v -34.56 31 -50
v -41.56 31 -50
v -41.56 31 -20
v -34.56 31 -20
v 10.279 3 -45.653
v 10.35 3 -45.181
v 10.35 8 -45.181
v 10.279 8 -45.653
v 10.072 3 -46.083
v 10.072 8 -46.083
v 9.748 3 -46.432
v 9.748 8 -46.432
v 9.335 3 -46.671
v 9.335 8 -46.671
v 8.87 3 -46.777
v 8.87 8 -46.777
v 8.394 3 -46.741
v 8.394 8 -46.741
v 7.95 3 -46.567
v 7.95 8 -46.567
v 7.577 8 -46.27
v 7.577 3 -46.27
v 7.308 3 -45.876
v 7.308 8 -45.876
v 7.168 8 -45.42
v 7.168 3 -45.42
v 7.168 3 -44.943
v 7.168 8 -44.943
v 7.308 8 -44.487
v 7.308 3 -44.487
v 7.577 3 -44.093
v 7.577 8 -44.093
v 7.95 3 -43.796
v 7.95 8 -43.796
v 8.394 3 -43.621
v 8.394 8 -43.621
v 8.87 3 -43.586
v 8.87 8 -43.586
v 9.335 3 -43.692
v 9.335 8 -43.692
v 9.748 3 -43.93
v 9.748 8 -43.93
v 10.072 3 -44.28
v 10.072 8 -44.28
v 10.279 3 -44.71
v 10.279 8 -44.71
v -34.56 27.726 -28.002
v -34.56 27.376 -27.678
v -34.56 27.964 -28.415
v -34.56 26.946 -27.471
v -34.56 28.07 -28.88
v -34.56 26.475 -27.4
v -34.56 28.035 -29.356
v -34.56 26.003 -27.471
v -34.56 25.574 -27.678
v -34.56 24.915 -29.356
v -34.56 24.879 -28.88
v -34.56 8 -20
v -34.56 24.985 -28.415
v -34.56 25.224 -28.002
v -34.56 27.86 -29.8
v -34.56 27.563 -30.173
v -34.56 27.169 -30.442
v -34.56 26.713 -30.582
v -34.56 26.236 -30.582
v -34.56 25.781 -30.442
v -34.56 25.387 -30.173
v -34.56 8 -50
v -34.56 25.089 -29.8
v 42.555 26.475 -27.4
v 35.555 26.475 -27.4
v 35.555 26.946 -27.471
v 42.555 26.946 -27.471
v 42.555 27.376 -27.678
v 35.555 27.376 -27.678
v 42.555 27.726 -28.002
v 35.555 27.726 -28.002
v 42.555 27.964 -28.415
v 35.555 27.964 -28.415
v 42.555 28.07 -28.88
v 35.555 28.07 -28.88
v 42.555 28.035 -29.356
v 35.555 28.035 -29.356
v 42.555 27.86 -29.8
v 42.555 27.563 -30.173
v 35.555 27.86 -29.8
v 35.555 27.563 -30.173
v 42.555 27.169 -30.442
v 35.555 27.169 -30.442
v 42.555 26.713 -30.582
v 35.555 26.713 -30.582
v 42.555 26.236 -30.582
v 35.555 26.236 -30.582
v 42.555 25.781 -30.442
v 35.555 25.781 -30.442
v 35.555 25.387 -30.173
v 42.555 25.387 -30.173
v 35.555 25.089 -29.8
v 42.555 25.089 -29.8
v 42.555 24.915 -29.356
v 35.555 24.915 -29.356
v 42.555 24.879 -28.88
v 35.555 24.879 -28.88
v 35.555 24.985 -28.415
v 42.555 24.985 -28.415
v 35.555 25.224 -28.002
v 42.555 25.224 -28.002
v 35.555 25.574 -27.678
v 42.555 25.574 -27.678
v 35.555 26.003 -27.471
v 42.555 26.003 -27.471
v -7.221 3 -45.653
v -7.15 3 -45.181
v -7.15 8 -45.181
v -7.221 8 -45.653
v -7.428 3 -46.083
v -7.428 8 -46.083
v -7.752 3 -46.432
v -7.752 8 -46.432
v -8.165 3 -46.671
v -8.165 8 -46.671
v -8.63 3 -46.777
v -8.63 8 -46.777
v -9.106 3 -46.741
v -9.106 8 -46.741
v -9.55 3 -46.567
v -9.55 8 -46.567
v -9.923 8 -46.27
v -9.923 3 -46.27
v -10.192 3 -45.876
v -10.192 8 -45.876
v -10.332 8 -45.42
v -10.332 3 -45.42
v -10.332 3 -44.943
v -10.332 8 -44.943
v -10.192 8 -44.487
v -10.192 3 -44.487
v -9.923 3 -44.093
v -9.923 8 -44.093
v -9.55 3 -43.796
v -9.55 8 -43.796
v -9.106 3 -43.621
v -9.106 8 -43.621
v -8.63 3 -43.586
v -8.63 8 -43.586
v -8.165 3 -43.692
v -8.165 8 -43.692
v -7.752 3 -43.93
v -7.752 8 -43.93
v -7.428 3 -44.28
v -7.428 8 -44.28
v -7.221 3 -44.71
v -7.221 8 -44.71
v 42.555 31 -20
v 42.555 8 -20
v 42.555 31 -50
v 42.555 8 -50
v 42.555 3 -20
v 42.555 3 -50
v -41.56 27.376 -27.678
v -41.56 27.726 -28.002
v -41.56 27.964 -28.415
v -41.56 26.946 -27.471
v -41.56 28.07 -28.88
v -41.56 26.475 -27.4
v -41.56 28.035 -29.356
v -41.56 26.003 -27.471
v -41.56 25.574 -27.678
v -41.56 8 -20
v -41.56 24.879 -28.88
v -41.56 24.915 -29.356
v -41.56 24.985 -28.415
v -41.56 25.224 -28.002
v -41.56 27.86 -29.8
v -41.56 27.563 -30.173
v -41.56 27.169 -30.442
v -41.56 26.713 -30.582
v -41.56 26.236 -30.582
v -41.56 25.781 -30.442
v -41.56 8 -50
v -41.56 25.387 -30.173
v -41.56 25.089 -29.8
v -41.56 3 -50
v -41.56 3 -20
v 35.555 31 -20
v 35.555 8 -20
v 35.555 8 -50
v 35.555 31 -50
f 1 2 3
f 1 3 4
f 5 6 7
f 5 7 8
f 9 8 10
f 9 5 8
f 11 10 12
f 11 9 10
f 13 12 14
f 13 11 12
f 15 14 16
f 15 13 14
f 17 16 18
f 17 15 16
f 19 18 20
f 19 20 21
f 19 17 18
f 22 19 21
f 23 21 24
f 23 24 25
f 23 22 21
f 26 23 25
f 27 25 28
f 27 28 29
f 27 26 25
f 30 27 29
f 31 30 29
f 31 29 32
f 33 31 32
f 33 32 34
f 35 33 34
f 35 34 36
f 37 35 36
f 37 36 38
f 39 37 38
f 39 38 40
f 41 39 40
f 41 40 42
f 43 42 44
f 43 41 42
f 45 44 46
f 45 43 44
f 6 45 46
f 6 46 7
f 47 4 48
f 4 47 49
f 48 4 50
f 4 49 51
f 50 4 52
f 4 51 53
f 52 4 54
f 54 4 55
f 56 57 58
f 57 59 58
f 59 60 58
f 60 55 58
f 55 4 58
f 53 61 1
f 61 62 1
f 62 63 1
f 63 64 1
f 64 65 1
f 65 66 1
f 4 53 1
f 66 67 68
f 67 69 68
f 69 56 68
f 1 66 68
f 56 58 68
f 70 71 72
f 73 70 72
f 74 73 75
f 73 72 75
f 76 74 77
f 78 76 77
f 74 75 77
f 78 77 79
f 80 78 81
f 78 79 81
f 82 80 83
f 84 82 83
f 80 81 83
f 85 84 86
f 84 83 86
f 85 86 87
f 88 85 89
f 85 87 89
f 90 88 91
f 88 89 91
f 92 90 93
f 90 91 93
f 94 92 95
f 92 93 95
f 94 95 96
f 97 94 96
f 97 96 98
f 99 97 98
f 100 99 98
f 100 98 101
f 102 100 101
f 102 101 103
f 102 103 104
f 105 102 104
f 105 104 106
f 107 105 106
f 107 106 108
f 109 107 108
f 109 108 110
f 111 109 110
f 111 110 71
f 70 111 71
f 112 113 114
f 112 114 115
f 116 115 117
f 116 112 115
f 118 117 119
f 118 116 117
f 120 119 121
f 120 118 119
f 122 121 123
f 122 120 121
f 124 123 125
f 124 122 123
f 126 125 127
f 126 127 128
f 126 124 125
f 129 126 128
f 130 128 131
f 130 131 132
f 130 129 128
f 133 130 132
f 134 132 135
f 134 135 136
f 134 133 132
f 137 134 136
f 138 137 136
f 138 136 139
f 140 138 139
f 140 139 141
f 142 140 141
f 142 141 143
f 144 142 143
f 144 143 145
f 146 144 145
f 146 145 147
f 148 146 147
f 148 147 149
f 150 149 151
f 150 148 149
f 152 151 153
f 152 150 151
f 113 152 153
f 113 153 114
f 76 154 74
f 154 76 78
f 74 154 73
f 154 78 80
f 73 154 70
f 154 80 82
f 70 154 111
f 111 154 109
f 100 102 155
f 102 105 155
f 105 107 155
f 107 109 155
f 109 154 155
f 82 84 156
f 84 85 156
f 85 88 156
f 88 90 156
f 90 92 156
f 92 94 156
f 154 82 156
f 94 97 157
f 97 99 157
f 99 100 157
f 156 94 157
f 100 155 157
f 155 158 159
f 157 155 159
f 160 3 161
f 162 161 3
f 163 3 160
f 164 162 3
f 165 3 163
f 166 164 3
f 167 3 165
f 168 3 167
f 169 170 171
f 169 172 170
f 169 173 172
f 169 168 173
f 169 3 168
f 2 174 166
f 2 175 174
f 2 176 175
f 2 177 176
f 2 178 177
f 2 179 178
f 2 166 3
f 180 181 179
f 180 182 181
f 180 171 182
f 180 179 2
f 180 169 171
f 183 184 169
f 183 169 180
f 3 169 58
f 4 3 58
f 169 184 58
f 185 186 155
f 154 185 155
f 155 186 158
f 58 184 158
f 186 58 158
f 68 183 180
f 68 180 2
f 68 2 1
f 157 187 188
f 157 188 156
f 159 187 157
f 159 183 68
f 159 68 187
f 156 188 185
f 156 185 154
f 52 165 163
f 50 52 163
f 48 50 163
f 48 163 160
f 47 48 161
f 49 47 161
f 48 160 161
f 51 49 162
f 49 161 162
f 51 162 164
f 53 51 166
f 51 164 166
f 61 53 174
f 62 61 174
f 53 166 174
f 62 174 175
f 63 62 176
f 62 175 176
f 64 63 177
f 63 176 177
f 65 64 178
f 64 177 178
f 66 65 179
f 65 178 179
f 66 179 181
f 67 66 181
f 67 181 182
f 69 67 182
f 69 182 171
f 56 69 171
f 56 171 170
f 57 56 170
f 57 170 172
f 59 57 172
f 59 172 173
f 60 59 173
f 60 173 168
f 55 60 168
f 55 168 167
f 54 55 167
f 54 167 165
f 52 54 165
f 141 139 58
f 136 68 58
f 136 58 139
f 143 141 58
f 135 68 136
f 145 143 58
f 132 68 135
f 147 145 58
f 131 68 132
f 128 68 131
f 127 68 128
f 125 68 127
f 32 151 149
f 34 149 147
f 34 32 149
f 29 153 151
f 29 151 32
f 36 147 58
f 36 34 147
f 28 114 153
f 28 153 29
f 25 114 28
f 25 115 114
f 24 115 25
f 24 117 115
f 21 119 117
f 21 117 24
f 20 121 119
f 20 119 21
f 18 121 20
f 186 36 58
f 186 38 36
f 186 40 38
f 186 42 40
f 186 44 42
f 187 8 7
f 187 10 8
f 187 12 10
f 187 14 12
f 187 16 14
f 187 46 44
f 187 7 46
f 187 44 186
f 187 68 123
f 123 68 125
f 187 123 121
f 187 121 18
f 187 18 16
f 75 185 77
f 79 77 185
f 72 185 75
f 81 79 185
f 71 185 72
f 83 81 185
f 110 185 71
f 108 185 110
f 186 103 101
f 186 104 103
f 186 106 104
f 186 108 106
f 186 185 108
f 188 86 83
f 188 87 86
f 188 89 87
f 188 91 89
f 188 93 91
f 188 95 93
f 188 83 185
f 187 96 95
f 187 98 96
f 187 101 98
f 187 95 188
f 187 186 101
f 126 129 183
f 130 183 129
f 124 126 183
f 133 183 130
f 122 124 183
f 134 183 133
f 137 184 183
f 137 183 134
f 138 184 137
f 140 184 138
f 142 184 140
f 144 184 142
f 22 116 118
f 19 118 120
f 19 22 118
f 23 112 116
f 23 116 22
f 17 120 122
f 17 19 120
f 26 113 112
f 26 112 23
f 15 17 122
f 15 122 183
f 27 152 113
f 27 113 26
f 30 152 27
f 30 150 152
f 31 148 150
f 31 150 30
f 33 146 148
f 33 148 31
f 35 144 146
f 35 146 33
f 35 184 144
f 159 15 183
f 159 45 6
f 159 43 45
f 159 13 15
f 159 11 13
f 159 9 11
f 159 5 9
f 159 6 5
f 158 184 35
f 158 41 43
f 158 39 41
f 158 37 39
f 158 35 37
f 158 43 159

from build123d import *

# Parameters (mm, degrees)
SKETCH1_W           = 95.7
SKETCH1_H           = 100
SKETCH1_R           = 1.6
BOSS_EXTRUDE1_DEPTH = 3
SKETCH2_W           = 84.114636839
SKETCH2_H           = 30
SKETCH2_R           = 1.6
BOSS_EXTRUDE2_DEPTH = 5
SKETCH3_W           = 7
SKETCH3_H           = 30
BOSS_EXTRUDE3_DEPTH = 23
SKETCH4_R           = 1.6
CUT_EXTRUDE1_DEPTH  = 114
SKETCH5_W           = 95.7
SKETCH5_H           = 6
CUT_EXTRUDE2_DEPTH  = 114


with BuildPart() as part:
    # Sketch1 → Boss-Extrude1 (new body, symmetric)
    with BuildSketch(Plane(origin=(0, 0, 0), x_dir=(1, 0, 0), z_dir=(0, 1, 0))):
        Rectangle(SKETCH1_W, SKETCH1_H)
        with Locations((-8.75, 45.181367204)):
            Circle(SKETCH1_R, mode=Mode.SUBTRACT)
        with Locations((8.75, 45.181367204)):
            Circle(SKETCH1_R, mode=Mode.SUBTRACT)
        with Locations((0, -46)):
            Circle(SKETCH1_R, mode=Mode.SUBTRACT)
    extrude(amount=BOSS_EXTRUDE1_DEPTH, both=True)

    # Sketch2 → Boss-Extrude2 (add)
    with BuildSketch(Plane(origin=(0, 3, 0), x_dir=(1, 0, 0), z_dir=(0, 1, 0))):
        with Locations((0.497719744, 35)):
            Rectangle(SKETCH2_W, SKETCH2_H)
        with Locations((-8.75, 45.181367204)):
            Circle(SKETCH2_R, mode=Mode.SUBTRACT)
        with Locations((8.75, 45.181367204)):
            Circle(SKETCH2_R, mode=Mode.SUBTRACT)
        with Locations((0.497719744, 35)):
            Rectangle(SKETCH2_W, SKETCH2_H)
        with Locations((-8.75, 45.181367204)):
            Circle(SKETCH2_R, mode=Mode.SUBTRACT)
        with Locations((8.75, 45.181367204)):
            Circle(SKETCH2_R, mode=Mode.SUBTRACT)
    extrude(amount=BOSS_EXTRUDE2_DEPTH)

    # Sketch3 → Boss-Extrude3 (add)
    with BuildSketch(Plane(origin=(0, 8, 0), x_dir=(1, 0, 0), z_dir=(0, 1, 0))):
        with Locations((-38.059598675, 35)):
            Rectangle(SKETCH3_W, SKETCH3_H)
        with Locations((39.055038164, 35)):
            Rectangle(SKETCH3_W, SKETCH3_H)
    extrude(amount=BOSS_EXTRUDE3_DEPTH)

    # Sketch4 → Cut-Extrude1 (cut)
    with BuildSketch(Plane.ZY.offset(41.559598675)):
        with Locations((-29, 26.474830264)):
            Circle(SKETCH4_R)
    extrude(amount=-CUT_EXTRUDE1_DEPTH, mode=Mode.SUBTRACT)

    # Sketch5 → Cut-Extrude2 (cut)
    with BuildSketch(Plane.XY.offset(50)):
        Rectangle(SKETCH5_W, SKETCH5_H)
    extrude(amount=-CUT_EXTRUDE2_DEPTH, mode=Mode.SUBTRACT)


solid = part.part
